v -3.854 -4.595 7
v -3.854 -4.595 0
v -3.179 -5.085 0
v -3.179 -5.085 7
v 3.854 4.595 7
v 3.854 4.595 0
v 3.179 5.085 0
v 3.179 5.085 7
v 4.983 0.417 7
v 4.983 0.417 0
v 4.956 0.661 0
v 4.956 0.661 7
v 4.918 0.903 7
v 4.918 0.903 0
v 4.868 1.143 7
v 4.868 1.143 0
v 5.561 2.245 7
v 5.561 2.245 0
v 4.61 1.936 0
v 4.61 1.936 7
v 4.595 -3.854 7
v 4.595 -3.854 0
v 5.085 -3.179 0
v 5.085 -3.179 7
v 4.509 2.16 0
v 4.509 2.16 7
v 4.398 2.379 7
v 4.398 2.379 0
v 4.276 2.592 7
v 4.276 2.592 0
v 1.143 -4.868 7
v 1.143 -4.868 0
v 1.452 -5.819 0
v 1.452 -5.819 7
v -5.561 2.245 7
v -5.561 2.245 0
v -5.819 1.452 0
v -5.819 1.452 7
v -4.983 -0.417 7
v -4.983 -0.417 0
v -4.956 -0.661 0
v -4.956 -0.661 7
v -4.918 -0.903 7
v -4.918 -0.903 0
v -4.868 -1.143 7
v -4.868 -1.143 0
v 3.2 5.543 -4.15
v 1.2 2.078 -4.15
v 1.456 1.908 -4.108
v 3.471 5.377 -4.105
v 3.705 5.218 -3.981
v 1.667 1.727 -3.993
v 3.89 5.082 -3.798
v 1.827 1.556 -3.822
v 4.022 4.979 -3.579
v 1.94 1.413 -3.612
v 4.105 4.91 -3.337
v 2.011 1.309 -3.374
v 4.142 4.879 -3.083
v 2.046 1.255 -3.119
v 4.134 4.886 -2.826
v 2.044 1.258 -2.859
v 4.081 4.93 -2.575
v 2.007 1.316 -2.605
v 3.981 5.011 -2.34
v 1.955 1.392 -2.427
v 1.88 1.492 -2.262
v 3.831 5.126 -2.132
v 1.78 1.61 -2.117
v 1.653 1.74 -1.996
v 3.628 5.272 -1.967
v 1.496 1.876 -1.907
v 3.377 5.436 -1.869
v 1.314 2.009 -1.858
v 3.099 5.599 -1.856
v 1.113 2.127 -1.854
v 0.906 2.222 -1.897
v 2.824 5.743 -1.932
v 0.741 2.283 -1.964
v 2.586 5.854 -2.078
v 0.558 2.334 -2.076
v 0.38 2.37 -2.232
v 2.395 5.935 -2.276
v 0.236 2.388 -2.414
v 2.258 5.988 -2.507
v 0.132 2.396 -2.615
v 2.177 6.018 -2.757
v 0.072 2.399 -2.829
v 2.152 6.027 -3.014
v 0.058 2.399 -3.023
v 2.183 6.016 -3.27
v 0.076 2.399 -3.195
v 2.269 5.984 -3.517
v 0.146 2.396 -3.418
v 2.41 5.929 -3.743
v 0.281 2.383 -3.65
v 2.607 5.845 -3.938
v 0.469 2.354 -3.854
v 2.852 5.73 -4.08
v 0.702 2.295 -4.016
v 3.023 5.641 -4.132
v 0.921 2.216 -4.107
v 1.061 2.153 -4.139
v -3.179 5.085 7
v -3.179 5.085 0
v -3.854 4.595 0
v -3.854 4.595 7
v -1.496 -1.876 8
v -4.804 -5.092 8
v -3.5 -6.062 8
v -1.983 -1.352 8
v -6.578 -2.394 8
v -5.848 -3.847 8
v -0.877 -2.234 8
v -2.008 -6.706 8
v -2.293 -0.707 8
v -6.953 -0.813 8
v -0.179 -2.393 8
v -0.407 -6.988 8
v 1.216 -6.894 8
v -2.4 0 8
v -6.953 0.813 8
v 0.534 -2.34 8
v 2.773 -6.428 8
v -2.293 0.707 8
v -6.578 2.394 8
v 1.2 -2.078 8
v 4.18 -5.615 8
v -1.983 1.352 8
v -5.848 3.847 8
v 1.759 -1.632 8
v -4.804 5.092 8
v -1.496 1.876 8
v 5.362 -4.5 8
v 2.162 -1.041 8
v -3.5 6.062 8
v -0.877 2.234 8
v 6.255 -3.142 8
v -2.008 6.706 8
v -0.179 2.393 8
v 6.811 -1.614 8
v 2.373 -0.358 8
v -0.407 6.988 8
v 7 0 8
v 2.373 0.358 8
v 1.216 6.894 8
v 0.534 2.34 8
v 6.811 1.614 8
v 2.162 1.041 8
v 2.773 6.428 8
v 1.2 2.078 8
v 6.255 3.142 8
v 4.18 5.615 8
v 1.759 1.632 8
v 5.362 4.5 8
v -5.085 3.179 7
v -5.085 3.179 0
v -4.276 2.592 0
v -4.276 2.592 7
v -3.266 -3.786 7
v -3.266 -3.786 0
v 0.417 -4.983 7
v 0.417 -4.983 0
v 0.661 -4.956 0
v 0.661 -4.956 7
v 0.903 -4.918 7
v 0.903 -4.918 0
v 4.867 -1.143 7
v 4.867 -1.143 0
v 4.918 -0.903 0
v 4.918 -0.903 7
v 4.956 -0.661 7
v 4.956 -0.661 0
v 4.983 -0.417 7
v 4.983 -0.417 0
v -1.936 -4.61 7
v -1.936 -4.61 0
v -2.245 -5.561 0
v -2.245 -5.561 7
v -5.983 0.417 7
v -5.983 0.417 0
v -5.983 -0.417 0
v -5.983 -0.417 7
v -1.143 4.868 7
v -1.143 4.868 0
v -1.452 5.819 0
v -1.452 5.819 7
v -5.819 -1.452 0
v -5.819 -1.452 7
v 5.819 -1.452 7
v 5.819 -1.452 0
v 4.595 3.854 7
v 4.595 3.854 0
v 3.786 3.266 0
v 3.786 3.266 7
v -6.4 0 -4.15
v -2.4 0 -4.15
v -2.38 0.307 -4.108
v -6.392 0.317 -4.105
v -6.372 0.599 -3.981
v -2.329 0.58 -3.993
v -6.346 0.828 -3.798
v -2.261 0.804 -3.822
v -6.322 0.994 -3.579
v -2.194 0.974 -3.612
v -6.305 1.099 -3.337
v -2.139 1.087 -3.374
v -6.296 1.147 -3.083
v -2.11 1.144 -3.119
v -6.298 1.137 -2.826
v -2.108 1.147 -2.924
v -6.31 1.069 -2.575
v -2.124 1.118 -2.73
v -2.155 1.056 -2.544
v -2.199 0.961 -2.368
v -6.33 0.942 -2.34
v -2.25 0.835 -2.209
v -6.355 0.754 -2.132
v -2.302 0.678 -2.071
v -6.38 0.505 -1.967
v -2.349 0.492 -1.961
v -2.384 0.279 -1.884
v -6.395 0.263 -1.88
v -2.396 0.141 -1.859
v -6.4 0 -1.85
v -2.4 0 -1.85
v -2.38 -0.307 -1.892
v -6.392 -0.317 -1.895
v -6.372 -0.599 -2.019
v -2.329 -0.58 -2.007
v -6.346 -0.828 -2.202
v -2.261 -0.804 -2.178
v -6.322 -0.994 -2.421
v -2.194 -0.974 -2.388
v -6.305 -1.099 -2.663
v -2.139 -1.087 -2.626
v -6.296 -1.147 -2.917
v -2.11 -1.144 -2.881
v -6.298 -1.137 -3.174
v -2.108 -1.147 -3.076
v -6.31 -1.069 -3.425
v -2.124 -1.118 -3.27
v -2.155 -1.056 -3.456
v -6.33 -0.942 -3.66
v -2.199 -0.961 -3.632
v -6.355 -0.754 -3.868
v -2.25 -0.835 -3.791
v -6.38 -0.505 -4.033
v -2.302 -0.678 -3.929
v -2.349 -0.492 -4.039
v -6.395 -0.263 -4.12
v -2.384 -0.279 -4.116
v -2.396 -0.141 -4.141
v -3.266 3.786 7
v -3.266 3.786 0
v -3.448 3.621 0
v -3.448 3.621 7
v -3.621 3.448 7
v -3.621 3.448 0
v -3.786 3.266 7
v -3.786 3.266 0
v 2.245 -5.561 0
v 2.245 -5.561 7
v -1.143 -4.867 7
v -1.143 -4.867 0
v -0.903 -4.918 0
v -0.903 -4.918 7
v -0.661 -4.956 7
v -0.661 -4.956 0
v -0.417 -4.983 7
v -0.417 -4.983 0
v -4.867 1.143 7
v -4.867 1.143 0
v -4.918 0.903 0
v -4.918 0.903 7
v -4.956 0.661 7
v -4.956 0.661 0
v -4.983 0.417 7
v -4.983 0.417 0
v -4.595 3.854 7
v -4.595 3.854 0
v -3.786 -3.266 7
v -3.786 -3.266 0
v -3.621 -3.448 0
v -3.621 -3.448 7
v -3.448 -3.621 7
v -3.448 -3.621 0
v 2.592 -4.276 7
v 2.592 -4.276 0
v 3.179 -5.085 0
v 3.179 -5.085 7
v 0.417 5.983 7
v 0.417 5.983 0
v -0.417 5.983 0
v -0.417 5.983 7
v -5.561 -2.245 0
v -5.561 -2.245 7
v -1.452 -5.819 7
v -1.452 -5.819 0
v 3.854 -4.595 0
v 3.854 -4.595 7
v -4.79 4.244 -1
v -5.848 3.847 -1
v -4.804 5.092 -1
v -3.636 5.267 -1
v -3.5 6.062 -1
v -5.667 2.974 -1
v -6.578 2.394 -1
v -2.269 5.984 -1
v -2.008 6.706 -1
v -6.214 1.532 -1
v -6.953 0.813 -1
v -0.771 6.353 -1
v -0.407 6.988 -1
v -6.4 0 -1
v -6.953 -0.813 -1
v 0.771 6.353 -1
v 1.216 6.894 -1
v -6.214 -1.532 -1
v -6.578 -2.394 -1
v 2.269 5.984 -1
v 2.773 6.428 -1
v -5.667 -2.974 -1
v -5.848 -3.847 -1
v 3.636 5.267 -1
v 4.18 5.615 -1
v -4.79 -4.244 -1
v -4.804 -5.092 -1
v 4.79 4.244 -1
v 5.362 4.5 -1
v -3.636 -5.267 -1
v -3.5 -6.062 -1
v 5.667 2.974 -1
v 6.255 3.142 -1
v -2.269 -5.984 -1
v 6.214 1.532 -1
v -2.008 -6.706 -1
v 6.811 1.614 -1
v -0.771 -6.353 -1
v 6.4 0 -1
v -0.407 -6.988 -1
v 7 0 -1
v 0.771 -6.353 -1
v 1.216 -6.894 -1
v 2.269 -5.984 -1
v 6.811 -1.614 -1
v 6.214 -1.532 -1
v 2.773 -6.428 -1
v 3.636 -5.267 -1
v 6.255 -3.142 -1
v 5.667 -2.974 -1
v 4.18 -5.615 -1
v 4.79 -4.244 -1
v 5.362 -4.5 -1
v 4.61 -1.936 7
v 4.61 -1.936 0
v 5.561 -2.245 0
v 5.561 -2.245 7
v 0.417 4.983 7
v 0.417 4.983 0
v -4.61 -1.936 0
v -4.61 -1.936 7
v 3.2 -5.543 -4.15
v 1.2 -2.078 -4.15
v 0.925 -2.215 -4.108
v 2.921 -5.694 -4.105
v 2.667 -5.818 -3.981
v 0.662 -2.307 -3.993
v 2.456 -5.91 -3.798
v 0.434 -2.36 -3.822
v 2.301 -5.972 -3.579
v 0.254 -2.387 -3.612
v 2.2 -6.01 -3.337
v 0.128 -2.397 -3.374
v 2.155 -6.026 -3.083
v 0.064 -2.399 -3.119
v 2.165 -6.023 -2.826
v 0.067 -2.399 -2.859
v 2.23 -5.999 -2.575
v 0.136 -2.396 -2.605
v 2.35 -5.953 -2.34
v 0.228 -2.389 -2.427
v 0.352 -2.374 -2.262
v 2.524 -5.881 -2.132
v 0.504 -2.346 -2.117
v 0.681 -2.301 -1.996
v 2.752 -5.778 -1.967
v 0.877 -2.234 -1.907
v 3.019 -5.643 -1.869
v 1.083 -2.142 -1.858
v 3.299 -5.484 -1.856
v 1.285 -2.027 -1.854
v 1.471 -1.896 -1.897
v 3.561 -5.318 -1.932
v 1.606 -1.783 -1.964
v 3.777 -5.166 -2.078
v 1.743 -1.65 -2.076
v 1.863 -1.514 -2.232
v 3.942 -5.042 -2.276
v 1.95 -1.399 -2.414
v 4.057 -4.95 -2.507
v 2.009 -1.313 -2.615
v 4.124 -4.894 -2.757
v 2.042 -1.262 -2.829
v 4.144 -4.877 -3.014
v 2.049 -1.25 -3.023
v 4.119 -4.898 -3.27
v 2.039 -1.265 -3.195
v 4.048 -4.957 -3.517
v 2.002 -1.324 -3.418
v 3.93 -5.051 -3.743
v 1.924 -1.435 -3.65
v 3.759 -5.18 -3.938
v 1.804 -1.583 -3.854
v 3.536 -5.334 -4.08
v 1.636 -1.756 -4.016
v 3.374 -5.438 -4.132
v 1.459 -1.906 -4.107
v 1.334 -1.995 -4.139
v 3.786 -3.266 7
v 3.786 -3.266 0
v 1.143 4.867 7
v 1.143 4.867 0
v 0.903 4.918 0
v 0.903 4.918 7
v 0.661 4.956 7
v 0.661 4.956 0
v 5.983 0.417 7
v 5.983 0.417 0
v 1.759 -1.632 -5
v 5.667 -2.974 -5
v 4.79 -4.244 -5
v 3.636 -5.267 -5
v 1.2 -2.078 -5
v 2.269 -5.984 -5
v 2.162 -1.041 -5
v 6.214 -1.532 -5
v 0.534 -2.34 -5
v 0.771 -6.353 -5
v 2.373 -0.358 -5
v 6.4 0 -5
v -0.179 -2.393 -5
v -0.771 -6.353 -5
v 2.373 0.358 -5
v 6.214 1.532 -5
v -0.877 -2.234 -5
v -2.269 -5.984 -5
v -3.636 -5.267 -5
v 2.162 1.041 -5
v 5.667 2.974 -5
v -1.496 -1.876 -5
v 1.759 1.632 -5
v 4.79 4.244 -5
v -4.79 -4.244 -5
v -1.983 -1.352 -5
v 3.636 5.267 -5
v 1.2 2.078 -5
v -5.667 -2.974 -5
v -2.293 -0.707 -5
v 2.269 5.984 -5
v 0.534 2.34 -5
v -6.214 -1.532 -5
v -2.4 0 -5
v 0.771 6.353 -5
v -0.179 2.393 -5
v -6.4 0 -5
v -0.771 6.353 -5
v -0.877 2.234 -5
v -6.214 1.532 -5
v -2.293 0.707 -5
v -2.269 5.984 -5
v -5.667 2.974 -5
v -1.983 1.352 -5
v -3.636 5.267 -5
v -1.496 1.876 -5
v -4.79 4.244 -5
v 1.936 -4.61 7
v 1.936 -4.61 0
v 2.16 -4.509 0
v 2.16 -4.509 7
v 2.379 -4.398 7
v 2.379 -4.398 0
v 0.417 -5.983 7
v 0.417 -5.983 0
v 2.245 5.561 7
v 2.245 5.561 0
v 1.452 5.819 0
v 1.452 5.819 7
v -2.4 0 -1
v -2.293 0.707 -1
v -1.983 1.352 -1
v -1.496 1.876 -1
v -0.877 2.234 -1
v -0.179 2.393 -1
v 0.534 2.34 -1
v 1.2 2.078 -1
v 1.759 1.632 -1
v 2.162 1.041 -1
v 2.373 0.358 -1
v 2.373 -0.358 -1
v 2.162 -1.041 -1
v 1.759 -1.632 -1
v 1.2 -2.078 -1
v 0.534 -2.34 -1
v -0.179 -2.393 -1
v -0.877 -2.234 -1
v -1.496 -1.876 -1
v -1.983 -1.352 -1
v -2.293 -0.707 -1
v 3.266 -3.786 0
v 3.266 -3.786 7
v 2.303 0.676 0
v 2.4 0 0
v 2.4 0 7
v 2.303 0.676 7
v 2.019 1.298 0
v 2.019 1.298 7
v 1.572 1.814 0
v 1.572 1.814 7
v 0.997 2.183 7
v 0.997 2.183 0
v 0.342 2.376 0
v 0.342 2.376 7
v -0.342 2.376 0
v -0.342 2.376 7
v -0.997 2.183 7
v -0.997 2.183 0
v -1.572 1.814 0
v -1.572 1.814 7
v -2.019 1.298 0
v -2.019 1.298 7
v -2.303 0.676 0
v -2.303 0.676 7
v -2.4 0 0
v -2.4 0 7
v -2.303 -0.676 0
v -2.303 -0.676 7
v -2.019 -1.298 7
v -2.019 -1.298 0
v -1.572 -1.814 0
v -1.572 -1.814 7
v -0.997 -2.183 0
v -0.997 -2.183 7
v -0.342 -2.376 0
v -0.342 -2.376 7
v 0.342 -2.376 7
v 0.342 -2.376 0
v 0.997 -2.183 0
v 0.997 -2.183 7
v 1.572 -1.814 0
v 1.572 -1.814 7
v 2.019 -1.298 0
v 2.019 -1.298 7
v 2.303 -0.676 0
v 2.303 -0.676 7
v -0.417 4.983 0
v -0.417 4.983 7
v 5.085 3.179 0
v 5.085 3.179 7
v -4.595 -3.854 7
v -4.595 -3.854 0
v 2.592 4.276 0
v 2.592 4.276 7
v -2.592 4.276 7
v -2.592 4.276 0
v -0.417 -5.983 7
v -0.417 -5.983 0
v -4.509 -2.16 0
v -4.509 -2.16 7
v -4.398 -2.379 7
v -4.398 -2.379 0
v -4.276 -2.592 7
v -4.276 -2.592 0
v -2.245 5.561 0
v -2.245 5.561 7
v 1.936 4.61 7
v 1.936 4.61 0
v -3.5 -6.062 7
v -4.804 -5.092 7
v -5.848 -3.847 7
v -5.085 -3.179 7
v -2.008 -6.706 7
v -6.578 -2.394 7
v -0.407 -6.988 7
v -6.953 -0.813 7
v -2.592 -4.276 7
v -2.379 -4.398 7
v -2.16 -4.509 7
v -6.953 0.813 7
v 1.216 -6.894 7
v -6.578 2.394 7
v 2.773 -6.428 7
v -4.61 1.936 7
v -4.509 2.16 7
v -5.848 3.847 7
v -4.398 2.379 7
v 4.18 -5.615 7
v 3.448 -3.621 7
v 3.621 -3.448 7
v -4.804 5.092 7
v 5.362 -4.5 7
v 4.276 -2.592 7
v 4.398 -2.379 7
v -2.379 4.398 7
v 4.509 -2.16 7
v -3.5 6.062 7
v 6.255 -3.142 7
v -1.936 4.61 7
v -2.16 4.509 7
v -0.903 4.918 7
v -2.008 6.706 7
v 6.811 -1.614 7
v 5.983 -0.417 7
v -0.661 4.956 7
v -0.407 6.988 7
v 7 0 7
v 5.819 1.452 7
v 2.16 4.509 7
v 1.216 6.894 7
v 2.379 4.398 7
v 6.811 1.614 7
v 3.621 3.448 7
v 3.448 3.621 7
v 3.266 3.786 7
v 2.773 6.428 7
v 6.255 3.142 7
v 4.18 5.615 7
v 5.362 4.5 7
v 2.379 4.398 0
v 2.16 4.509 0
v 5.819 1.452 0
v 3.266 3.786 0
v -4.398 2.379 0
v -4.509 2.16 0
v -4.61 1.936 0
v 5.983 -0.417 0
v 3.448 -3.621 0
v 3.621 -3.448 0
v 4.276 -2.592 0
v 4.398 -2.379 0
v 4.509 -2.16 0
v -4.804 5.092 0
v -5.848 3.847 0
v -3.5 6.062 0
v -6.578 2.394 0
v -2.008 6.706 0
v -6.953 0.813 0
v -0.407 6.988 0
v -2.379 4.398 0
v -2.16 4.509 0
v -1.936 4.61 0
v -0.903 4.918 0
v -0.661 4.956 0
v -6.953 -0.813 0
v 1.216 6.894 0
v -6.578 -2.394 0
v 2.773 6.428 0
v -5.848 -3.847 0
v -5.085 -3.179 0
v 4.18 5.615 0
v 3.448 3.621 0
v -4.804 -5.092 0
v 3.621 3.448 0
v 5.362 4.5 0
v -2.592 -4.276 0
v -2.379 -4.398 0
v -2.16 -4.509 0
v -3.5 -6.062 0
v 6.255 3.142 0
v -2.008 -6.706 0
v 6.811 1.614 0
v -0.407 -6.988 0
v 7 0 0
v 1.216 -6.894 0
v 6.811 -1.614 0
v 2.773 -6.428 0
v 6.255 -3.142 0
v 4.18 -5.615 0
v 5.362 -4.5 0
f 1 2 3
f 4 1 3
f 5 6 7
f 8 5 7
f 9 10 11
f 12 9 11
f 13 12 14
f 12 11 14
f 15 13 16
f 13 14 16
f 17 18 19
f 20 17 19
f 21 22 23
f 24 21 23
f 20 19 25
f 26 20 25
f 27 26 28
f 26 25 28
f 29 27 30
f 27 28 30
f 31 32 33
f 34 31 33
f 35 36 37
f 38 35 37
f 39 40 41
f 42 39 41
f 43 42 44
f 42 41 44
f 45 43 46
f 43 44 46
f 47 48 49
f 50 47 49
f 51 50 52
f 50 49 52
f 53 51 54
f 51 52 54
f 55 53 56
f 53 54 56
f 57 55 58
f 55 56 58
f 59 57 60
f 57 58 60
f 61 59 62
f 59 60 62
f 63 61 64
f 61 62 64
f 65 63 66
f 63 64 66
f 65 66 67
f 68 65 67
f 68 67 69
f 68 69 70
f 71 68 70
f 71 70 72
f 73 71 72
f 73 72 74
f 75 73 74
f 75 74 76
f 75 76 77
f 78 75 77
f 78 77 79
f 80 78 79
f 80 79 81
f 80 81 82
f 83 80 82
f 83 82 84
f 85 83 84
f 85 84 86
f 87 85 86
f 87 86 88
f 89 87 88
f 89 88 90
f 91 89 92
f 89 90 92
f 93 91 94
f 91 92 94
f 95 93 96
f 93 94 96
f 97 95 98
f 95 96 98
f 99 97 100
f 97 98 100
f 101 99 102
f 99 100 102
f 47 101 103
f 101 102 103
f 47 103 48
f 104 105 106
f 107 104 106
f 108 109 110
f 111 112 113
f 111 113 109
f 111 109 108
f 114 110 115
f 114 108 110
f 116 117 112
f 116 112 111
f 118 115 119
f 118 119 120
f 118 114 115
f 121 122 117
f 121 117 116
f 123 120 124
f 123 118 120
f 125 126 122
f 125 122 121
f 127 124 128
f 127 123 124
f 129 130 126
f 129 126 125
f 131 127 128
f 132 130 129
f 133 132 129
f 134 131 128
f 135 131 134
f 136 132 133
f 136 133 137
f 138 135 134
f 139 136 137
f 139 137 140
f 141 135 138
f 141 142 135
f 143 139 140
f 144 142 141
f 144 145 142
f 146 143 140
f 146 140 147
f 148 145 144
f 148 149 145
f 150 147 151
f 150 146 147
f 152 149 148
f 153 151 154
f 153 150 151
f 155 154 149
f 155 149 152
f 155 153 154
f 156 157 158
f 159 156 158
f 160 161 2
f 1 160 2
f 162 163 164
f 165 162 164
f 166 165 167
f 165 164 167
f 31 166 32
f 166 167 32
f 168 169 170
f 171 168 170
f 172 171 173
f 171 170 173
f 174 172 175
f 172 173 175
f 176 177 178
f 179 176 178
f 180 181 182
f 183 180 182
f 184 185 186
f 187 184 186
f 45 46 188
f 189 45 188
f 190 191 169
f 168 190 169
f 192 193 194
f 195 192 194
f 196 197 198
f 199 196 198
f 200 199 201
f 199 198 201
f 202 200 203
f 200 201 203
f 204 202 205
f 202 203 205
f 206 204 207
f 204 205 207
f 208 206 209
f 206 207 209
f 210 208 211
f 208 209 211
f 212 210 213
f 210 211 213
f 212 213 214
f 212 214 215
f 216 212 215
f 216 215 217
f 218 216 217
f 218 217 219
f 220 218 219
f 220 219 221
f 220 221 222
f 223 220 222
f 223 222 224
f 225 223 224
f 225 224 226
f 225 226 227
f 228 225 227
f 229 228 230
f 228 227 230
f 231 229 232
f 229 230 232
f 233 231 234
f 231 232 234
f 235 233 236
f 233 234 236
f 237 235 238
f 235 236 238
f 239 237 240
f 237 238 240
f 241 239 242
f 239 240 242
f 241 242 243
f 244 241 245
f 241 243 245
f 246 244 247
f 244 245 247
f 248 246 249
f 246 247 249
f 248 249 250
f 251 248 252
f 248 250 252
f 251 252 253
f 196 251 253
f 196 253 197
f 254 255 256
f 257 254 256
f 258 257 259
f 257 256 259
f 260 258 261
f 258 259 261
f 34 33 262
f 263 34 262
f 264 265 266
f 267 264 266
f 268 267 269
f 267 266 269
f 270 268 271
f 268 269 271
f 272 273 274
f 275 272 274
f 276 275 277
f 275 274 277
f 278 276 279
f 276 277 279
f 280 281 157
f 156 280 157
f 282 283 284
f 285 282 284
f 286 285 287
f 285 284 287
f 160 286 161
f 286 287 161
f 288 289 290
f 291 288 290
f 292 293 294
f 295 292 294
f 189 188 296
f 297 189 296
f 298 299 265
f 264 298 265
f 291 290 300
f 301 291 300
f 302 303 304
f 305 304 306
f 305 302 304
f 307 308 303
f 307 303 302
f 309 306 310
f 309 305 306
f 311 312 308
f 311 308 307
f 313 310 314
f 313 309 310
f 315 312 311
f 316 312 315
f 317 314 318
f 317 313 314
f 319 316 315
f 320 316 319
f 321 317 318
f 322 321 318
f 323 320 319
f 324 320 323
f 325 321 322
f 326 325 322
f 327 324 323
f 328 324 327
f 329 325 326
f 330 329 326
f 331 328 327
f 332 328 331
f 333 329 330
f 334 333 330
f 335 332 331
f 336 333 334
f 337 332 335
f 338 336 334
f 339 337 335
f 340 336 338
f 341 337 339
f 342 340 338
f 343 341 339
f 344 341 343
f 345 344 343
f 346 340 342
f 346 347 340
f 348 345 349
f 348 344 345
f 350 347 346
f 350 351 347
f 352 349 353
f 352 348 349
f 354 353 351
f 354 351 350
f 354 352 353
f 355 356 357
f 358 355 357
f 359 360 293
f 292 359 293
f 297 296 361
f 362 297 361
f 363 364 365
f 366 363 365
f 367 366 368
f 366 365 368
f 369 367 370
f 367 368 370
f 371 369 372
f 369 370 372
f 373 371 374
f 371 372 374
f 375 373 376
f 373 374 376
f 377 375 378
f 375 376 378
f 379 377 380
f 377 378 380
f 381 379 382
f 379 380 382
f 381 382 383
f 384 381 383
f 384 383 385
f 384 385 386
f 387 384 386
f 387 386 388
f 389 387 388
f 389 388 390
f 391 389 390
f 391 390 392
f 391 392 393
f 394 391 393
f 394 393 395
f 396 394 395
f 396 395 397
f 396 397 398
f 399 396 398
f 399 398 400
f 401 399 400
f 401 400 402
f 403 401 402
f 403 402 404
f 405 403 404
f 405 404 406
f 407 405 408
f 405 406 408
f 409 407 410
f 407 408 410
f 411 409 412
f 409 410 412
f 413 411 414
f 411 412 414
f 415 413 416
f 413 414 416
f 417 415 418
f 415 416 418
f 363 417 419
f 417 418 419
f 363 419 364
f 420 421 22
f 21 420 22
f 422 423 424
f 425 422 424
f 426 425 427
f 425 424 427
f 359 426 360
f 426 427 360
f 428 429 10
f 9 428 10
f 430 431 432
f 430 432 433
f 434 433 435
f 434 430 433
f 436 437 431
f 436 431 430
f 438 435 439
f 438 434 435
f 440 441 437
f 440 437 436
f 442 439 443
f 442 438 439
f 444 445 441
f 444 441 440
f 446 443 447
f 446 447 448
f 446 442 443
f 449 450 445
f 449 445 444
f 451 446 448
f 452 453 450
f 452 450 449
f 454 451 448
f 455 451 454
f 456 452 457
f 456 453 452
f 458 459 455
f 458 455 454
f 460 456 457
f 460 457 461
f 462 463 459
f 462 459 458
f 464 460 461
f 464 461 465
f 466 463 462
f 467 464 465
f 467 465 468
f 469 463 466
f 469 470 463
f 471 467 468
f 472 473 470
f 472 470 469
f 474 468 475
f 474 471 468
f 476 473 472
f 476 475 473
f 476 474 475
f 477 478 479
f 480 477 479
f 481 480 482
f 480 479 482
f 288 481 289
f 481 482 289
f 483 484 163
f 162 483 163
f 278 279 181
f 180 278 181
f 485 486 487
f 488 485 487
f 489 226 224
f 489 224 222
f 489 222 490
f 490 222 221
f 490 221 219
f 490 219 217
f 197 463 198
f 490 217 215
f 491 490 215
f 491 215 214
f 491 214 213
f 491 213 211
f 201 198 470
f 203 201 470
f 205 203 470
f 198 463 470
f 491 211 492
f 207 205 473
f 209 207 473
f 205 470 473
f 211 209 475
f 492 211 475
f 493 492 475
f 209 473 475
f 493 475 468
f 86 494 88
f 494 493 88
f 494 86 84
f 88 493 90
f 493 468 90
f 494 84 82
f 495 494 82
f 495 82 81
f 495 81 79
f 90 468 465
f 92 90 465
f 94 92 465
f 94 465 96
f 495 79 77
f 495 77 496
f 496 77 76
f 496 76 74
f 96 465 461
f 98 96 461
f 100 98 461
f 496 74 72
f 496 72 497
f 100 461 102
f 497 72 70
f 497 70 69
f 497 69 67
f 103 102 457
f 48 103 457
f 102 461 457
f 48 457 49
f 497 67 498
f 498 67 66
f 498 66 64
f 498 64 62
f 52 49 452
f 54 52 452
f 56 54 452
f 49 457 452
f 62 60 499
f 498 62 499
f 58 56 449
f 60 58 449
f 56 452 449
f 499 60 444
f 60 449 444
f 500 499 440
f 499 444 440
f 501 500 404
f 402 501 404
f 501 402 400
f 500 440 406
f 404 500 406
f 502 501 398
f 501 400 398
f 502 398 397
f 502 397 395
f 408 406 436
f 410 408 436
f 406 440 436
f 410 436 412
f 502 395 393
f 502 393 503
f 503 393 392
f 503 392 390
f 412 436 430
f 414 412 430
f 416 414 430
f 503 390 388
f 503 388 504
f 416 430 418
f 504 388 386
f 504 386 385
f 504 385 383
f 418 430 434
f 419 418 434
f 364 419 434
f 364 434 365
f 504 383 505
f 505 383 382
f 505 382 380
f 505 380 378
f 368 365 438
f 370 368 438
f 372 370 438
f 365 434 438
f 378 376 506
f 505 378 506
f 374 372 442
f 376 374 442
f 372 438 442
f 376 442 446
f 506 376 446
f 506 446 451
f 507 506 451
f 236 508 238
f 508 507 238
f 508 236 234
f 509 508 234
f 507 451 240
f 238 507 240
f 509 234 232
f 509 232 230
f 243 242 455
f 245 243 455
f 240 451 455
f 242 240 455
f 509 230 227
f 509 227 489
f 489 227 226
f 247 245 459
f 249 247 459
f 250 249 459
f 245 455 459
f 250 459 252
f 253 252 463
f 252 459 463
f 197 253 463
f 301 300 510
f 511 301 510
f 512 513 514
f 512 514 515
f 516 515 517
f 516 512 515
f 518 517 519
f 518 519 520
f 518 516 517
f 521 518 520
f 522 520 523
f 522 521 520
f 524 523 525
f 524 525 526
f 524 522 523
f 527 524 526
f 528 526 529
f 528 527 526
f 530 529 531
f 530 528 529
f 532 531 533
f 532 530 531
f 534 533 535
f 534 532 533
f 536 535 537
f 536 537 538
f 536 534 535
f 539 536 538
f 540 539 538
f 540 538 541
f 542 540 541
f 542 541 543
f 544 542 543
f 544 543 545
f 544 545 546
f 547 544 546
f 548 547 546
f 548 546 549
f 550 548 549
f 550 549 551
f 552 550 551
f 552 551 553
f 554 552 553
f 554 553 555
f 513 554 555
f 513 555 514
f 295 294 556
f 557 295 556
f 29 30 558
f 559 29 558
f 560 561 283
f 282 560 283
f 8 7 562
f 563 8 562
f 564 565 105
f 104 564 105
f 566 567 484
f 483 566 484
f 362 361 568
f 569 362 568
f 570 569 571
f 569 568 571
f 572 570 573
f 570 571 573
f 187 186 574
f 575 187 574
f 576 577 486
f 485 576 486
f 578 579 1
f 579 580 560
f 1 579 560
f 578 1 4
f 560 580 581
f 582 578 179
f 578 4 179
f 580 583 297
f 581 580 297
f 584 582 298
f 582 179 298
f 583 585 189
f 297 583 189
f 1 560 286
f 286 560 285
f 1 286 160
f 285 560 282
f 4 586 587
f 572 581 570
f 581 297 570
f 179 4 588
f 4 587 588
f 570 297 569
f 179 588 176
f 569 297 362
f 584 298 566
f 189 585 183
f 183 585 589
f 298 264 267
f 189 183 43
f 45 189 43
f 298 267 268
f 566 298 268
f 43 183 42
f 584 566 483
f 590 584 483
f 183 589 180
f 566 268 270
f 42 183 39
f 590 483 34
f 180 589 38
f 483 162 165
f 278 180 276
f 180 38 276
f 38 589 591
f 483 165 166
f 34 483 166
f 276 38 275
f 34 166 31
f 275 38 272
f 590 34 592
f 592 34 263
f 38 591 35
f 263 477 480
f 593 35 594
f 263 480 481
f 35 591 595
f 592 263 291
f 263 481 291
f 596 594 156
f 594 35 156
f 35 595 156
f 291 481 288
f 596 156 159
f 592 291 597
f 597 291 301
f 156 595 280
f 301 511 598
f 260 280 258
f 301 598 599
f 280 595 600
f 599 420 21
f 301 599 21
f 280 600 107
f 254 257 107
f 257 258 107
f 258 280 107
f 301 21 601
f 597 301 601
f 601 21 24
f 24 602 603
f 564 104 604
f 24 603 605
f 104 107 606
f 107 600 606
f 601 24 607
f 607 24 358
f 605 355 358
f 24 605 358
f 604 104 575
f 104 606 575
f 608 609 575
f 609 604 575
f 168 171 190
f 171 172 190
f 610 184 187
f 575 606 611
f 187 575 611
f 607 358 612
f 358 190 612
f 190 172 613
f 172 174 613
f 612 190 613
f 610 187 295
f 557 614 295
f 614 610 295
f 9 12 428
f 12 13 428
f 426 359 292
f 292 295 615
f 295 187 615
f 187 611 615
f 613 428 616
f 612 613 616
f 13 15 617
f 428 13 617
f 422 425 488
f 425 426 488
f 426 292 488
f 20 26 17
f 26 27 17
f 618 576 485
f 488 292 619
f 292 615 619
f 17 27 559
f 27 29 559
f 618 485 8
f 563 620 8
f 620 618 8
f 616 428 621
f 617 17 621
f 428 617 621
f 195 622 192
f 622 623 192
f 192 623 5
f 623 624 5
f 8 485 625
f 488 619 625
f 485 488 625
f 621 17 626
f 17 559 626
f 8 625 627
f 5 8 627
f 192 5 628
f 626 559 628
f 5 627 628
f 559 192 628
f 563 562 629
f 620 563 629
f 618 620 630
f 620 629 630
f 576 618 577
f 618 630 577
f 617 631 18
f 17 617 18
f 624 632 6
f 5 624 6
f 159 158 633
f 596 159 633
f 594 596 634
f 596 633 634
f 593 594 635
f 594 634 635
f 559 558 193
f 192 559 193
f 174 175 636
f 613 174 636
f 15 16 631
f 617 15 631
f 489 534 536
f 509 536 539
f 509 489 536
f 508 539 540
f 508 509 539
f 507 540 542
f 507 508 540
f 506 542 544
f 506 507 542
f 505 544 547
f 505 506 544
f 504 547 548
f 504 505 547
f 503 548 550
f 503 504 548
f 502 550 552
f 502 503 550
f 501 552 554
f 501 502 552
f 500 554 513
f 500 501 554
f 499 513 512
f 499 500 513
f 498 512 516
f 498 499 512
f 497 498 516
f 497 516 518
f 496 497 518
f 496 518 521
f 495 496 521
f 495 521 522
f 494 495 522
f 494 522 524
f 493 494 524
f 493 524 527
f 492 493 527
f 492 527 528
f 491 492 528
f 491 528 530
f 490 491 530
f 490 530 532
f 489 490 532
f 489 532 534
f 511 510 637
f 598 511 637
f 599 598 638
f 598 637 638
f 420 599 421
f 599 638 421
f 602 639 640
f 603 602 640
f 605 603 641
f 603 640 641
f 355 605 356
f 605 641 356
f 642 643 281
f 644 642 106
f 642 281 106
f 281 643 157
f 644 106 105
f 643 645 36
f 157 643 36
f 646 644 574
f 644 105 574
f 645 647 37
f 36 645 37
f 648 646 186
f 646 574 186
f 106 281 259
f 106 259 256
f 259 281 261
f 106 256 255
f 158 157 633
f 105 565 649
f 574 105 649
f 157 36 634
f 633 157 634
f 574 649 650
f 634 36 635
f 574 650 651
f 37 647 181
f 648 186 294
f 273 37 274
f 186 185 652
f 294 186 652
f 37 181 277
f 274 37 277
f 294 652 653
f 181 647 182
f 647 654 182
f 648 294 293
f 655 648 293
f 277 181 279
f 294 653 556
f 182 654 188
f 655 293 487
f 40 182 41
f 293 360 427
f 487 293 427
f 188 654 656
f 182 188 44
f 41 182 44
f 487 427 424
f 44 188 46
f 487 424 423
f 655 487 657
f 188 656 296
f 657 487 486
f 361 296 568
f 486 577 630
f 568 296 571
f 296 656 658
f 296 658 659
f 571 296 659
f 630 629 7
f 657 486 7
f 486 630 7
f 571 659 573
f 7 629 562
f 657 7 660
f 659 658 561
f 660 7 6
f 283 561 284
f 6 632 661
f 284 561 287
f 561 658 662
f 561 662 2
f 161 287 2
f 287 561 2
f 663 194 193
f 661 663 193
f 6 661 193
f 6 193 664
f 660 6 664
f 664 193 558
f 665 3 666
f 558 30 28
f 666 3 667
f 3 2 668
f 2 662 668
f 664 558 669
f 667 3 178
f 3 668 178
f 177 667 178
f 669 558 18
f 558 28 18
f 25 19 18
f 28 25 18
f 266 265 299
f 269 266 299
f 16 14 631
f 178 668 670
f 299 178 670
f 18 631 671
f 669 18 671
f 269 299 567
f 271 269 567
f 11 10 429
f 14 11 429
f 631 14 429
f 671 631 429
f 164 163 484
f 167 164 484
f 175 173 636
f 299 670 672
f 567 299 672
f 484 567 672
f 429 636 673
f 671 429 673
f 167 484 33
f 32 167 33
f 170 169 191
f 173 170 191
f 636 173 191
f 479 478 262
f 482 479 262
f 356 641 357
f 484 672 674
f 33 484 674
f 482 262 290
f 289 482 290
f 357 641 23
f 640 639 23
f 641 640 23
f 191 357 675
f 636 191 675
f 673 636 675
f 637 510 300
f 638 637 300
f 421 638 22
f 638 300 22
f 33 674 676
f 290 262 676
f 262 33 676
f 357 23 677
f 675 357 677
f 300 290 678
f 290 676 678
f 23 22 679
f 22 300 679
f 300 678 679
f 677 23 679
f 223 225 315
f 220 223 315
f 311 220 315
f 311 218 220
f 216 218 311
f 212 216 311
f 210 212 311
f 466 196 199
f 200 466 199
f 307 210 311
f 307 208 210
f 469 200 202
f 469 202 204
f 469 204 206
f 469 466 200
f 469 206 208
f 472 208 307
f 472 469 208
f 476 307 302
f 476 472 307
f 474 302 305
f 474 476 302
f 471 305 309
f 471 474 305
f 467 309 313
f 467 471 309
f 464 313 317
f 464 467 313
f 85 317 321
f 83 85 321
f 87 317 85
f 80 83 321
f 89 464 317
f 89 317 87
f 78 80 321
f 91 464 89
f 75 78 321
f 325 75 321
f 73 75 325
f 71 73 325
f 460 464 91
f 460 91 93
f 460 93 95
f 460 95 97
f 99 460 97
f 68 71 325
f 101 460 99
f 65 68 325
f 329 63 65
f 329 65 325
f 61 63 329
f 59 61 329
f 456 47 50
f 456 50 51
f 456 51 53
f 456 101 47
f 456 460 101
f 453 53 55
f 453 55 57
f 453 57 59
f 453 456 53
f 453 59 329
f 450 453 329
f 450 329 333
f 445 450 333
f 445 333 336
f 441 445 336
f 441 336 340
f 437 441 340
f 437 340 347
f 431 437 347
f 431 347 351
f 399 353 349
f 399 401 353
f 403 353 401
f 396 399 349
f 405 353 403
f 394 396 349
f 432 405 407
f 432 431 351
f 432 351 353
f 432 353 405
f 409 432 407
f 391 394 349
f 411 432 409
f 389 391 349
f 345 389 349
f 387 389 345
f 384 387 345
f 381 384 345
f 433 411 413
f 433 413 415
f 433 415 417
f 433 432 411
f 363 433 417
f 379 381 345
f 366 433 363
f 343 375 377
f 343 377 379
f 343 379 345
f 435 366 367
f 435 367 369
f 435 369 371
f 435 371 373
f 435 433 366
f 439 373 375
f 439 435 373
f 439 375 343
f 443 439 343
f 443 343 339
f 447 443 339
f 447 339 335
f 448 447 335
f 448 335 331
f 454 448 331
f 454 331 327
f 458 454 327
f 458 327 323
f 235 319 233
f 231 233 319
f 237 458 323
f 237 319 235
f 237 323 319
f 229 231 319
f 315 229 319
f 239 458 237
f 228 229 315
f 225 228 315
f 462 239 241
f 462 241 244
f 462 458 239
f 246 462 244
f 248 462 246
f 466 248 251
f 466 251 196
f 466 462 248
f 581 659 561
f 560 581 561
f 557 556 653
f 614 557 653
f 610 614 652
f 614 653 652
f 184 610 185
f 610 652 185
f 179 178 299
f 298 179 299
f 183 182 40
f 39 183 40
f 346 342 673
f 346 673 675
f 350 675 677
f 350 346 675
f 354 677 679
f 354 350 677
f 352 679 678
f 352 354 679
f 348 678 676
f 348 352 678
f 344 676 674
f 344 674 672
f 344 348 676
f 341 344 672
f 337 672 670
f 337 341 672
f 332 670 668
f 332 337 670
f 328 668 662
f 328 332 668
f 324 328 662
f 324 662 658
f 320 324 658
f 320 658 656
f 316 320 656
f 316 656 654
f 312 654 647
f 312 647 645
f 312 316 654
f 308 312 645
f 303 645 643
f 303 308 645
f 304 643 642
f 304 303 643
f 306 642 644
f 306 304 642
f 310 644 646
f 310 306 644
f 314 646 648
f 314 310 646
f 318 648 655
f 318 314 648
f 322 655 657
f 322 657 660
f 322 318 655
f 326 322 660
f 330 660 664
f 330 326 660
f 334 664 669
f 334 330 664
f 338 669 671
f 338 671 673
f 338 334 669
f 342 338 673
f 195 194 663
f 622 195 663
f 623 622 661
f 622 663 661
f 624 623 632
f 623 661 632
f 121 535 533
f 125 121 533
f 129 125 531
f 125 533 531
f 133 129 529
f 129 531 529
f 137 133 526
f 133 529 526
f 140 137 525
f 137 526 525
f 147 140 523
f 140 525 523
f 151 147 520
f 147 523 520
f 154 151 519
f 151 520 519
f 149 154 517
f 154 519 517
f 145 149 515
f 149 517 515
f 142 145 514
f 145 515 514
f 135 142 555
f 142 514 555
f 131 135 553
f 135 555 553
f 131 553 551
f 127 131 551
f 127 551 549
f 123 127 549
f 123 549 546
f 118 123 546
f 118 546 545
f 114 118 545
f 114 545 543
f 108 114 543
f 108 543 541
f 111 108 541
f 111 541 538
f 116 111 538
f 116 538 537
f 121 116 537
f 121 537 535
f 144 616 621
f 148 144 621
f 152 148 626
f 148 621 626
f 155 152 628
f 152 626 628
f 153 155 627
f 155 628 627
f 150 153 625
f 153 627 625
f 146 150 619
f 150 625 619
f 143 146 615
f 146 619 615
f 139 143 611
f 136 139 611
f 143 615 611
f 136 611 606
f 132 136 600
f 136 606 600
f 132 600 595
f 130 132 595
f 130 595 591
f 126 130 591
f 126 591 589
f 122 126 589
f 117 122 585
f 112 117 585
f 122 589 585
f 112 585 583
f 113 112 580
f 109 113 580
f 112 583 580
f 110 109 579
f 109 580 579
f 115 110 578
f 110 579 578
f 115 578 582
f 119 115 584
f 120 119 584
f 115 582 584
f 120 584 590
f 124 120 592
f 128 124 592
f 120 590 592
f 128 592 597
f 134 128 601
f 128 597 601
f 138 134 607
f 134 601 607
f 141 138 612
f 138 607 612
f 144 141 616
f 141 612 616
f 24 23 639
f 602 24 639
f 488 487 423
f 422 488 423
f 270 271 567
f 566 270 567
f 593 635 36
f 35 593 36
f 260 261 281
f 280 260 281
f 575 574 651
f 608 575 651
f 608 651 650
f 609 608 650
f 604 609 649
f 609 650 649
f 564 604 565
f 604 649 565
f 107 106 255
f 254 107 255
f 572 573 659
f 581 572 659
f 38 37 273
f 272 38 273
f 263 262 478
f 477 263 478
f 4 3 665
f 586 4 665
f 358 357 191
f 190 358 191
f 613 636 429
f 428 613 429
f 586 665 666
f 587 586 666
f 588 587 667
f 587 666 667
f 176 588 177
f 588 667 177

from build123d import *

# Parameters (mm, degrees)
ESQUISSE1_R                  = 2.4
BOSS_EXTRU_1_DEPTH           = 7
ESQUISSE2_R                  = 7
BOSS_EXTRU_2_DEPTH           = 1
ESQUISSE3_R                  = 2.4
ENL_V_MAT_EXTRU_1_DEPTH      = 1
BOSS_EXTRU_3_START           = 1
ESQUISSE4_R                  = 7
BOSS_EXTRU_3_DEPTH           = 1
ENL_V_START                  = -1
ESQUISSE5_R                  = 2.4
ENL_V_MAT_EXTRU_2_DEPTH      = 1
BOSS_EXTRU_4_START           = 4
ESQUISSE6_R                  = 6.4
ESQUISSE6_R_2                = 2.4
BOSS_EXTRU_4_DEPTH           = 4
ESQUISSE7_R                  = 1.15
ENL_V_MAT_EXTRU_3_DEPTH      = 8
R_P_TITION_CIRCULAIRE1_COUNT = 3


with BuildPart() as part:
    # Esquisse1 → Boss.-Extru.1 (new body)
    with BuildSketch(Plane.XY):
        with BuildLine():
            Line((0.41669139, 5.982606575), (-0.416666667, 5.982606575))
            Line((-0.416666667, 5.982606575), (-0.416666667, 4.982608643))
            ThreePointArc((-0.416666667, 4.982608643), (-0.782160073, 4.938443644), (-1.143413046, 4.867505173))
            Line((-1.143413046, 4.867505173), (-1.452430041, 5.818561689))
            Line((-1.452430041, 5.818561689), (-2.245000651, 5.561039887))
            Line((-2.245000651, 5.561039887), (-1.935984295, 4.609985337))
            ThreePointArc((-1.935984295, 4.609985337), (-2.269941446, 4.455038253), (-2.591592247, 4.27593845))
            Line((-2.591592247, 4.27593845), (-3.179377499, 5.084955444))
            Line((-3.179377499, 5.084955444), (-3.85357833, 4.595119868))
            Line((-3.85357833, 4.595119868), (-3.265794293, 3.786104547))
            ThreePointArc((-3.265794293, 3.786104547), (-3.535525134, 3.535542677), (-3.786088342, 3.265813079))
            Line((-3.786088342, 3.265813079), (-4.595105336, 3.853598331))
            Line((-4.595105336, 3.853598331), (-5.084940912, 3.179397501))
            Line((-5.084940912, 3.179397501), (-4.27592559, 2.591613464))
            ThreePointArc((-4.27592559, 2.591613464), (-4.455026989, 2.269963551), (-4.609975731, 1.93600717))
            Line((-4.609975731, 1.93600717), (-5.561032247, 2.245024164))
            Line((-5.561032247, 2.245024164), (-5.818554049, 1.452453554))
            Line((-5.818554049, 1.452453554), (-4.867499499, 1.143437199))
            ThreePointArc((-4.867499499, 1.143437199), (-4.938439762, 0.782184577), (-4.982606575, 0.41669139))
            Line((-4.982606575, 0.41669139), (-5.982606575, 0.41669139))
            Line((-5.982606575, 0.41669139), (-5.982606575, -0.416666667))
            Line((-5.982606575, -0.416666667), (-4.982608643, -0.416666667))
            ThreePointArc((-4.982608643, -0.416666667), (-4.938443644, -0.782160073), (-4.867505173, -1.143413046))
            Line((-4.867505173, -1.143413046), (-5.818561689, -1.452430041))
            Line((-5.818561689, -1.452430041), (-5.561039887, -2.245000651))
            Line((-5.561039887, -2.245000651), (-4.609985337, -1.935984295))
            ThreePointArc((-4.609985337, -1.935984295), (-4.455038253, -2.269941446), (-4.27593845, -2.591592247))
            Line((-4.27593845, -2.591592247), (-5.084955444, -3.179377499))
            Line((-5.084955444, -3.179377499), (-4.595119868, -3.85357833))
            Line((-4.595119868, -3.85357833), (-3.786104547, -3.265794293))
            ThreePointArc((-3.786104547, -3.265794293), (-3.535542677, -3.535525134), (-3.265813079, -3.786088342))
            Line((-3.265813079, -3.786088342), (-3.853598331, -4.595105336))
            Line((-3.853598331, -4.595105336), (-3.179397501, -5.084940912))
            Line((-3.179397501, -5.084940912), (-2.591613464, -4.27592559))
            ThreePointArc((-2.591613464, -4.27592559), (-2.269963551, -4.455026989), (-1.93600717, -4.609975731))
            Line((-1.93600717, -4.609975731), (-2.245024164, -5.561032247))
            Line((-2.245024164, -5.561032247), (-1.452453554, -5.818554049))
            Line((-1.452453554, -5.818554049), (-1.143437199, -4.867499499))
            ThreePointArc((-1.143437199, -4.867499499), (-0.782184577, -4.938439762), (-0.41669139, -4.982606575))
            Line((-0.41669139, -4.982606575), (-0.41669139, -5.982606575))
            Line((-0.41669139, -5.982606575), (0.416666667, -5.982606575))
            Line((0.416666667, -5.982606575), (0.416666667, -4.982608643))
            ThreePointArc((0.416666667, -4.982608643), (0.782160073, -4.938443644), (1.143413046, -4.867505173))
            Line((1.143413046, -4.867505173), (1.452430041, -5.818561689))
            Line((1.452430041, -5.818561689), (2.245000651, -5.561039887))
            Line((2.245000651, -5.561039887), (1.935984295, -4.609985337))
            ThreePointArc((1.935984295, -4.609985337), (2.269941446, -4.455038253), (2.591592247, -4.27593845))
            Line((2.591592247, -4.27593845), (3.179377499, -5.084955444))
            Line((3.179377499, -5.084955444), (3.85357833, -4.595119868))
            Line((3.85357833, -4.595119868), (3.265794293, -3.786104547))
            ThreePointArc((3.265794293, -3.786104547), (3.535525134, -3.535542677), (3.786088342, -3.265813079))
            Line((3.786088342, -3.265813079), (4.595105336, -3.853598331))
            Line((4.595105336, -3.853598331), (5.084940912, -3.179397501))
            Line((5.084940912, -3.179397501), (4.27592559, -2.591613464))
            ThreePointArc((4.27592559, -2.591613464), (4.455026989, -2.269963551), (4.609975731, -1.93600717))
            Line((4.609975731, -1.93600717), (5.561032247, -2.245024164))
            Line((5.561032247, -2.245024164), (5.818554049, -1.452453554))
            Line((5.818554049, -1.452453554), (4.867499499, -1.143437199))
            ThreePointArc((4.867499499, -1.143437199), (4.938439762, -0.782184577), (4.982606575, -0.41669139))
            Line((4.982606575, -0.41669139), (5.982606575, -0.41669139))
            Line((5.982606575, -0.41669139), (5.982606575, 0.416666667))
            Line((5.982606575, 0.416666667), (4.982608643, 0.416666667))
            ThreePointArc((4.982608643, 0.416666667), (4.938443644, 0.782160073), (4.867505173, 1.143413046))
            Line((4.867505173, 1.143413046), (5.818561689, 1.452430041))
            Line((5.818561689, 1.452430041), (5.561039887, 2.245000651))
            Line((5.561039887, 2.245000651), (4.609985337, 1.935984295))
            ThreePointArc((4.609985337, 1.935984295), (4.455038253, 2.269941446), (4.27593845, 2.591592247))
            Line((4.27593845, 2.591592247), (5.084955444, 3.179377499))
            Line((5.084955444, 3.179377499), (4.595119868, 3.85357833))
            Line((4.595119868, 3.85357833), (3.786104547, 3.265794293))
            ThreePointArc((3.786104547, 3.265794293), (3.535542677, 3.535525134), (3.265813079, 3.786088342))
            Line((3.265813079, 3.786088342), (3.853598331, 4.595105336))
            Line((3.853598331, 4.595105336), (3.179397501, 5.084940912))
            Line((3.179397501, 5.084940912), (2.591613464, 4.27592559))
            ThreePointArc((2.591613464, 4.27592559), (2.269963551, 4.455026989), (1.93600717, 4.609975731))
            Line((1.93600717, 4.609975731), (2.245024164, 5.561032247))
            Line((2.245024164, 5.561032247), (1.452453554, 5.818554049))
            Line((1.452453554, 5.818554049), (1.143437199, 4.867499499))
            ThreePointArc((1.143437199, 4.867499499), (0.782184577, 4.938439762), (0.41669139, 4.982606575))
            Line((0.41669139, 4.982606575), (0.41669139, 5.982606575))
        make_face()
        Circle(ESQUISSE1_R, mode=Mode.SUBTRACT)
    extrude(amount=BOSS_EXTRU_1_DEPTH)

    # Esquisse2 → Boss.-Extru.2 (add)
    with BuildSketch(Plane.XY.offset(7)):
        Circle(ESQUISSE2_R)
    extrude(amount=BOSS_EXTRU_2_DEPTH)

    # Esquisse3 → Enlèv. mat.-Extru.1 (cut)
    with BuildSketch(Plane(origin=(0, 0, 7), x_dir=(-1, 0, 0), z_dir=(0, 0, -1))):
        Circle(ESQUISSE3_R)
    extrude(amount=-ENL_V_MAT_EXTRU_1_DEPTH, mode=Mode.SUBTRACT)

    # Esquisse4 → Boss.-Extru.3 (add)
    with BuildSketch(Plane(origin=(0, 0, 0), x_dir=(-1, 0, 0), z_dir=(0, 0, -1)).offset(BOSS_EXTRU_3_START)):
        with Locations(Location((0, 0, 0), (0, 0, 180))):
            Circle(ESQUISSE4_R)
    extrude(amount=-BOSS_EXTRU_3_DEPTH)

    # Esquisse5 → Enlèv. mat.-Extru.2 (cut)
    with BuildSketch(Plane.XY.offset(ENL_V_START)):
        with Locations(Location((0, 0, 0), (0, 0, 180))):
            Circle(ESQUISSE5_R)
    extrude(amount=ENL_V_MAT_EXTRU_2_DEPTH, mode=Mode.SUBTRACT)

    # Esquisse6 → Boss.-Extru.4 (add)
    with BuildSketch(Plane(origin=(0, 0, -1), x_dir=(-1, 0, 0), z_dir=(0, 0, -1)).offset(BOSS_EXTRU_4_START)):
        Circle(ESQUISSE6_R)
        Circle(ESQUISSE6_R_2, mode=Mode.SUBTRACT)
    extrude(amount=-BOSS_EXTRU_4_DEPTH)

    # Esquisse7 → Enlèv. mat.-Extru.3 (cut)
    with BuildSketch(Plane(origin=(0, 0, 0), x_dir=(0, 0, -1), z_dir=(1, 0, 0))):
        with Locations((3, 0)):
            Circle(ESQUISSE7_R)
    enl_v_mat_extru_3 = extrude(amount=-ENL_V_MAT_EXTRU_3_DEPTH, mode=Mode.SUBTRACT)

    # Répétition circulaire1: Enlèv. mat.-Extru.3 ×3 about axis
    r_p_tition_circulaire1_axis = Axis((0, 0, 0), (0, 0, -1))
    for i in range(1, R_P_TITION_CIRCULAIRE1_COUNT):
        add(enl_v_mat_extru_3.rotate(r_p_tition_circulaire1_axis, i * 360 / R_P_TITION_CIRCULAIRE1_COUNT), mode=Mode.SUBTRACT)


solid = part.part
